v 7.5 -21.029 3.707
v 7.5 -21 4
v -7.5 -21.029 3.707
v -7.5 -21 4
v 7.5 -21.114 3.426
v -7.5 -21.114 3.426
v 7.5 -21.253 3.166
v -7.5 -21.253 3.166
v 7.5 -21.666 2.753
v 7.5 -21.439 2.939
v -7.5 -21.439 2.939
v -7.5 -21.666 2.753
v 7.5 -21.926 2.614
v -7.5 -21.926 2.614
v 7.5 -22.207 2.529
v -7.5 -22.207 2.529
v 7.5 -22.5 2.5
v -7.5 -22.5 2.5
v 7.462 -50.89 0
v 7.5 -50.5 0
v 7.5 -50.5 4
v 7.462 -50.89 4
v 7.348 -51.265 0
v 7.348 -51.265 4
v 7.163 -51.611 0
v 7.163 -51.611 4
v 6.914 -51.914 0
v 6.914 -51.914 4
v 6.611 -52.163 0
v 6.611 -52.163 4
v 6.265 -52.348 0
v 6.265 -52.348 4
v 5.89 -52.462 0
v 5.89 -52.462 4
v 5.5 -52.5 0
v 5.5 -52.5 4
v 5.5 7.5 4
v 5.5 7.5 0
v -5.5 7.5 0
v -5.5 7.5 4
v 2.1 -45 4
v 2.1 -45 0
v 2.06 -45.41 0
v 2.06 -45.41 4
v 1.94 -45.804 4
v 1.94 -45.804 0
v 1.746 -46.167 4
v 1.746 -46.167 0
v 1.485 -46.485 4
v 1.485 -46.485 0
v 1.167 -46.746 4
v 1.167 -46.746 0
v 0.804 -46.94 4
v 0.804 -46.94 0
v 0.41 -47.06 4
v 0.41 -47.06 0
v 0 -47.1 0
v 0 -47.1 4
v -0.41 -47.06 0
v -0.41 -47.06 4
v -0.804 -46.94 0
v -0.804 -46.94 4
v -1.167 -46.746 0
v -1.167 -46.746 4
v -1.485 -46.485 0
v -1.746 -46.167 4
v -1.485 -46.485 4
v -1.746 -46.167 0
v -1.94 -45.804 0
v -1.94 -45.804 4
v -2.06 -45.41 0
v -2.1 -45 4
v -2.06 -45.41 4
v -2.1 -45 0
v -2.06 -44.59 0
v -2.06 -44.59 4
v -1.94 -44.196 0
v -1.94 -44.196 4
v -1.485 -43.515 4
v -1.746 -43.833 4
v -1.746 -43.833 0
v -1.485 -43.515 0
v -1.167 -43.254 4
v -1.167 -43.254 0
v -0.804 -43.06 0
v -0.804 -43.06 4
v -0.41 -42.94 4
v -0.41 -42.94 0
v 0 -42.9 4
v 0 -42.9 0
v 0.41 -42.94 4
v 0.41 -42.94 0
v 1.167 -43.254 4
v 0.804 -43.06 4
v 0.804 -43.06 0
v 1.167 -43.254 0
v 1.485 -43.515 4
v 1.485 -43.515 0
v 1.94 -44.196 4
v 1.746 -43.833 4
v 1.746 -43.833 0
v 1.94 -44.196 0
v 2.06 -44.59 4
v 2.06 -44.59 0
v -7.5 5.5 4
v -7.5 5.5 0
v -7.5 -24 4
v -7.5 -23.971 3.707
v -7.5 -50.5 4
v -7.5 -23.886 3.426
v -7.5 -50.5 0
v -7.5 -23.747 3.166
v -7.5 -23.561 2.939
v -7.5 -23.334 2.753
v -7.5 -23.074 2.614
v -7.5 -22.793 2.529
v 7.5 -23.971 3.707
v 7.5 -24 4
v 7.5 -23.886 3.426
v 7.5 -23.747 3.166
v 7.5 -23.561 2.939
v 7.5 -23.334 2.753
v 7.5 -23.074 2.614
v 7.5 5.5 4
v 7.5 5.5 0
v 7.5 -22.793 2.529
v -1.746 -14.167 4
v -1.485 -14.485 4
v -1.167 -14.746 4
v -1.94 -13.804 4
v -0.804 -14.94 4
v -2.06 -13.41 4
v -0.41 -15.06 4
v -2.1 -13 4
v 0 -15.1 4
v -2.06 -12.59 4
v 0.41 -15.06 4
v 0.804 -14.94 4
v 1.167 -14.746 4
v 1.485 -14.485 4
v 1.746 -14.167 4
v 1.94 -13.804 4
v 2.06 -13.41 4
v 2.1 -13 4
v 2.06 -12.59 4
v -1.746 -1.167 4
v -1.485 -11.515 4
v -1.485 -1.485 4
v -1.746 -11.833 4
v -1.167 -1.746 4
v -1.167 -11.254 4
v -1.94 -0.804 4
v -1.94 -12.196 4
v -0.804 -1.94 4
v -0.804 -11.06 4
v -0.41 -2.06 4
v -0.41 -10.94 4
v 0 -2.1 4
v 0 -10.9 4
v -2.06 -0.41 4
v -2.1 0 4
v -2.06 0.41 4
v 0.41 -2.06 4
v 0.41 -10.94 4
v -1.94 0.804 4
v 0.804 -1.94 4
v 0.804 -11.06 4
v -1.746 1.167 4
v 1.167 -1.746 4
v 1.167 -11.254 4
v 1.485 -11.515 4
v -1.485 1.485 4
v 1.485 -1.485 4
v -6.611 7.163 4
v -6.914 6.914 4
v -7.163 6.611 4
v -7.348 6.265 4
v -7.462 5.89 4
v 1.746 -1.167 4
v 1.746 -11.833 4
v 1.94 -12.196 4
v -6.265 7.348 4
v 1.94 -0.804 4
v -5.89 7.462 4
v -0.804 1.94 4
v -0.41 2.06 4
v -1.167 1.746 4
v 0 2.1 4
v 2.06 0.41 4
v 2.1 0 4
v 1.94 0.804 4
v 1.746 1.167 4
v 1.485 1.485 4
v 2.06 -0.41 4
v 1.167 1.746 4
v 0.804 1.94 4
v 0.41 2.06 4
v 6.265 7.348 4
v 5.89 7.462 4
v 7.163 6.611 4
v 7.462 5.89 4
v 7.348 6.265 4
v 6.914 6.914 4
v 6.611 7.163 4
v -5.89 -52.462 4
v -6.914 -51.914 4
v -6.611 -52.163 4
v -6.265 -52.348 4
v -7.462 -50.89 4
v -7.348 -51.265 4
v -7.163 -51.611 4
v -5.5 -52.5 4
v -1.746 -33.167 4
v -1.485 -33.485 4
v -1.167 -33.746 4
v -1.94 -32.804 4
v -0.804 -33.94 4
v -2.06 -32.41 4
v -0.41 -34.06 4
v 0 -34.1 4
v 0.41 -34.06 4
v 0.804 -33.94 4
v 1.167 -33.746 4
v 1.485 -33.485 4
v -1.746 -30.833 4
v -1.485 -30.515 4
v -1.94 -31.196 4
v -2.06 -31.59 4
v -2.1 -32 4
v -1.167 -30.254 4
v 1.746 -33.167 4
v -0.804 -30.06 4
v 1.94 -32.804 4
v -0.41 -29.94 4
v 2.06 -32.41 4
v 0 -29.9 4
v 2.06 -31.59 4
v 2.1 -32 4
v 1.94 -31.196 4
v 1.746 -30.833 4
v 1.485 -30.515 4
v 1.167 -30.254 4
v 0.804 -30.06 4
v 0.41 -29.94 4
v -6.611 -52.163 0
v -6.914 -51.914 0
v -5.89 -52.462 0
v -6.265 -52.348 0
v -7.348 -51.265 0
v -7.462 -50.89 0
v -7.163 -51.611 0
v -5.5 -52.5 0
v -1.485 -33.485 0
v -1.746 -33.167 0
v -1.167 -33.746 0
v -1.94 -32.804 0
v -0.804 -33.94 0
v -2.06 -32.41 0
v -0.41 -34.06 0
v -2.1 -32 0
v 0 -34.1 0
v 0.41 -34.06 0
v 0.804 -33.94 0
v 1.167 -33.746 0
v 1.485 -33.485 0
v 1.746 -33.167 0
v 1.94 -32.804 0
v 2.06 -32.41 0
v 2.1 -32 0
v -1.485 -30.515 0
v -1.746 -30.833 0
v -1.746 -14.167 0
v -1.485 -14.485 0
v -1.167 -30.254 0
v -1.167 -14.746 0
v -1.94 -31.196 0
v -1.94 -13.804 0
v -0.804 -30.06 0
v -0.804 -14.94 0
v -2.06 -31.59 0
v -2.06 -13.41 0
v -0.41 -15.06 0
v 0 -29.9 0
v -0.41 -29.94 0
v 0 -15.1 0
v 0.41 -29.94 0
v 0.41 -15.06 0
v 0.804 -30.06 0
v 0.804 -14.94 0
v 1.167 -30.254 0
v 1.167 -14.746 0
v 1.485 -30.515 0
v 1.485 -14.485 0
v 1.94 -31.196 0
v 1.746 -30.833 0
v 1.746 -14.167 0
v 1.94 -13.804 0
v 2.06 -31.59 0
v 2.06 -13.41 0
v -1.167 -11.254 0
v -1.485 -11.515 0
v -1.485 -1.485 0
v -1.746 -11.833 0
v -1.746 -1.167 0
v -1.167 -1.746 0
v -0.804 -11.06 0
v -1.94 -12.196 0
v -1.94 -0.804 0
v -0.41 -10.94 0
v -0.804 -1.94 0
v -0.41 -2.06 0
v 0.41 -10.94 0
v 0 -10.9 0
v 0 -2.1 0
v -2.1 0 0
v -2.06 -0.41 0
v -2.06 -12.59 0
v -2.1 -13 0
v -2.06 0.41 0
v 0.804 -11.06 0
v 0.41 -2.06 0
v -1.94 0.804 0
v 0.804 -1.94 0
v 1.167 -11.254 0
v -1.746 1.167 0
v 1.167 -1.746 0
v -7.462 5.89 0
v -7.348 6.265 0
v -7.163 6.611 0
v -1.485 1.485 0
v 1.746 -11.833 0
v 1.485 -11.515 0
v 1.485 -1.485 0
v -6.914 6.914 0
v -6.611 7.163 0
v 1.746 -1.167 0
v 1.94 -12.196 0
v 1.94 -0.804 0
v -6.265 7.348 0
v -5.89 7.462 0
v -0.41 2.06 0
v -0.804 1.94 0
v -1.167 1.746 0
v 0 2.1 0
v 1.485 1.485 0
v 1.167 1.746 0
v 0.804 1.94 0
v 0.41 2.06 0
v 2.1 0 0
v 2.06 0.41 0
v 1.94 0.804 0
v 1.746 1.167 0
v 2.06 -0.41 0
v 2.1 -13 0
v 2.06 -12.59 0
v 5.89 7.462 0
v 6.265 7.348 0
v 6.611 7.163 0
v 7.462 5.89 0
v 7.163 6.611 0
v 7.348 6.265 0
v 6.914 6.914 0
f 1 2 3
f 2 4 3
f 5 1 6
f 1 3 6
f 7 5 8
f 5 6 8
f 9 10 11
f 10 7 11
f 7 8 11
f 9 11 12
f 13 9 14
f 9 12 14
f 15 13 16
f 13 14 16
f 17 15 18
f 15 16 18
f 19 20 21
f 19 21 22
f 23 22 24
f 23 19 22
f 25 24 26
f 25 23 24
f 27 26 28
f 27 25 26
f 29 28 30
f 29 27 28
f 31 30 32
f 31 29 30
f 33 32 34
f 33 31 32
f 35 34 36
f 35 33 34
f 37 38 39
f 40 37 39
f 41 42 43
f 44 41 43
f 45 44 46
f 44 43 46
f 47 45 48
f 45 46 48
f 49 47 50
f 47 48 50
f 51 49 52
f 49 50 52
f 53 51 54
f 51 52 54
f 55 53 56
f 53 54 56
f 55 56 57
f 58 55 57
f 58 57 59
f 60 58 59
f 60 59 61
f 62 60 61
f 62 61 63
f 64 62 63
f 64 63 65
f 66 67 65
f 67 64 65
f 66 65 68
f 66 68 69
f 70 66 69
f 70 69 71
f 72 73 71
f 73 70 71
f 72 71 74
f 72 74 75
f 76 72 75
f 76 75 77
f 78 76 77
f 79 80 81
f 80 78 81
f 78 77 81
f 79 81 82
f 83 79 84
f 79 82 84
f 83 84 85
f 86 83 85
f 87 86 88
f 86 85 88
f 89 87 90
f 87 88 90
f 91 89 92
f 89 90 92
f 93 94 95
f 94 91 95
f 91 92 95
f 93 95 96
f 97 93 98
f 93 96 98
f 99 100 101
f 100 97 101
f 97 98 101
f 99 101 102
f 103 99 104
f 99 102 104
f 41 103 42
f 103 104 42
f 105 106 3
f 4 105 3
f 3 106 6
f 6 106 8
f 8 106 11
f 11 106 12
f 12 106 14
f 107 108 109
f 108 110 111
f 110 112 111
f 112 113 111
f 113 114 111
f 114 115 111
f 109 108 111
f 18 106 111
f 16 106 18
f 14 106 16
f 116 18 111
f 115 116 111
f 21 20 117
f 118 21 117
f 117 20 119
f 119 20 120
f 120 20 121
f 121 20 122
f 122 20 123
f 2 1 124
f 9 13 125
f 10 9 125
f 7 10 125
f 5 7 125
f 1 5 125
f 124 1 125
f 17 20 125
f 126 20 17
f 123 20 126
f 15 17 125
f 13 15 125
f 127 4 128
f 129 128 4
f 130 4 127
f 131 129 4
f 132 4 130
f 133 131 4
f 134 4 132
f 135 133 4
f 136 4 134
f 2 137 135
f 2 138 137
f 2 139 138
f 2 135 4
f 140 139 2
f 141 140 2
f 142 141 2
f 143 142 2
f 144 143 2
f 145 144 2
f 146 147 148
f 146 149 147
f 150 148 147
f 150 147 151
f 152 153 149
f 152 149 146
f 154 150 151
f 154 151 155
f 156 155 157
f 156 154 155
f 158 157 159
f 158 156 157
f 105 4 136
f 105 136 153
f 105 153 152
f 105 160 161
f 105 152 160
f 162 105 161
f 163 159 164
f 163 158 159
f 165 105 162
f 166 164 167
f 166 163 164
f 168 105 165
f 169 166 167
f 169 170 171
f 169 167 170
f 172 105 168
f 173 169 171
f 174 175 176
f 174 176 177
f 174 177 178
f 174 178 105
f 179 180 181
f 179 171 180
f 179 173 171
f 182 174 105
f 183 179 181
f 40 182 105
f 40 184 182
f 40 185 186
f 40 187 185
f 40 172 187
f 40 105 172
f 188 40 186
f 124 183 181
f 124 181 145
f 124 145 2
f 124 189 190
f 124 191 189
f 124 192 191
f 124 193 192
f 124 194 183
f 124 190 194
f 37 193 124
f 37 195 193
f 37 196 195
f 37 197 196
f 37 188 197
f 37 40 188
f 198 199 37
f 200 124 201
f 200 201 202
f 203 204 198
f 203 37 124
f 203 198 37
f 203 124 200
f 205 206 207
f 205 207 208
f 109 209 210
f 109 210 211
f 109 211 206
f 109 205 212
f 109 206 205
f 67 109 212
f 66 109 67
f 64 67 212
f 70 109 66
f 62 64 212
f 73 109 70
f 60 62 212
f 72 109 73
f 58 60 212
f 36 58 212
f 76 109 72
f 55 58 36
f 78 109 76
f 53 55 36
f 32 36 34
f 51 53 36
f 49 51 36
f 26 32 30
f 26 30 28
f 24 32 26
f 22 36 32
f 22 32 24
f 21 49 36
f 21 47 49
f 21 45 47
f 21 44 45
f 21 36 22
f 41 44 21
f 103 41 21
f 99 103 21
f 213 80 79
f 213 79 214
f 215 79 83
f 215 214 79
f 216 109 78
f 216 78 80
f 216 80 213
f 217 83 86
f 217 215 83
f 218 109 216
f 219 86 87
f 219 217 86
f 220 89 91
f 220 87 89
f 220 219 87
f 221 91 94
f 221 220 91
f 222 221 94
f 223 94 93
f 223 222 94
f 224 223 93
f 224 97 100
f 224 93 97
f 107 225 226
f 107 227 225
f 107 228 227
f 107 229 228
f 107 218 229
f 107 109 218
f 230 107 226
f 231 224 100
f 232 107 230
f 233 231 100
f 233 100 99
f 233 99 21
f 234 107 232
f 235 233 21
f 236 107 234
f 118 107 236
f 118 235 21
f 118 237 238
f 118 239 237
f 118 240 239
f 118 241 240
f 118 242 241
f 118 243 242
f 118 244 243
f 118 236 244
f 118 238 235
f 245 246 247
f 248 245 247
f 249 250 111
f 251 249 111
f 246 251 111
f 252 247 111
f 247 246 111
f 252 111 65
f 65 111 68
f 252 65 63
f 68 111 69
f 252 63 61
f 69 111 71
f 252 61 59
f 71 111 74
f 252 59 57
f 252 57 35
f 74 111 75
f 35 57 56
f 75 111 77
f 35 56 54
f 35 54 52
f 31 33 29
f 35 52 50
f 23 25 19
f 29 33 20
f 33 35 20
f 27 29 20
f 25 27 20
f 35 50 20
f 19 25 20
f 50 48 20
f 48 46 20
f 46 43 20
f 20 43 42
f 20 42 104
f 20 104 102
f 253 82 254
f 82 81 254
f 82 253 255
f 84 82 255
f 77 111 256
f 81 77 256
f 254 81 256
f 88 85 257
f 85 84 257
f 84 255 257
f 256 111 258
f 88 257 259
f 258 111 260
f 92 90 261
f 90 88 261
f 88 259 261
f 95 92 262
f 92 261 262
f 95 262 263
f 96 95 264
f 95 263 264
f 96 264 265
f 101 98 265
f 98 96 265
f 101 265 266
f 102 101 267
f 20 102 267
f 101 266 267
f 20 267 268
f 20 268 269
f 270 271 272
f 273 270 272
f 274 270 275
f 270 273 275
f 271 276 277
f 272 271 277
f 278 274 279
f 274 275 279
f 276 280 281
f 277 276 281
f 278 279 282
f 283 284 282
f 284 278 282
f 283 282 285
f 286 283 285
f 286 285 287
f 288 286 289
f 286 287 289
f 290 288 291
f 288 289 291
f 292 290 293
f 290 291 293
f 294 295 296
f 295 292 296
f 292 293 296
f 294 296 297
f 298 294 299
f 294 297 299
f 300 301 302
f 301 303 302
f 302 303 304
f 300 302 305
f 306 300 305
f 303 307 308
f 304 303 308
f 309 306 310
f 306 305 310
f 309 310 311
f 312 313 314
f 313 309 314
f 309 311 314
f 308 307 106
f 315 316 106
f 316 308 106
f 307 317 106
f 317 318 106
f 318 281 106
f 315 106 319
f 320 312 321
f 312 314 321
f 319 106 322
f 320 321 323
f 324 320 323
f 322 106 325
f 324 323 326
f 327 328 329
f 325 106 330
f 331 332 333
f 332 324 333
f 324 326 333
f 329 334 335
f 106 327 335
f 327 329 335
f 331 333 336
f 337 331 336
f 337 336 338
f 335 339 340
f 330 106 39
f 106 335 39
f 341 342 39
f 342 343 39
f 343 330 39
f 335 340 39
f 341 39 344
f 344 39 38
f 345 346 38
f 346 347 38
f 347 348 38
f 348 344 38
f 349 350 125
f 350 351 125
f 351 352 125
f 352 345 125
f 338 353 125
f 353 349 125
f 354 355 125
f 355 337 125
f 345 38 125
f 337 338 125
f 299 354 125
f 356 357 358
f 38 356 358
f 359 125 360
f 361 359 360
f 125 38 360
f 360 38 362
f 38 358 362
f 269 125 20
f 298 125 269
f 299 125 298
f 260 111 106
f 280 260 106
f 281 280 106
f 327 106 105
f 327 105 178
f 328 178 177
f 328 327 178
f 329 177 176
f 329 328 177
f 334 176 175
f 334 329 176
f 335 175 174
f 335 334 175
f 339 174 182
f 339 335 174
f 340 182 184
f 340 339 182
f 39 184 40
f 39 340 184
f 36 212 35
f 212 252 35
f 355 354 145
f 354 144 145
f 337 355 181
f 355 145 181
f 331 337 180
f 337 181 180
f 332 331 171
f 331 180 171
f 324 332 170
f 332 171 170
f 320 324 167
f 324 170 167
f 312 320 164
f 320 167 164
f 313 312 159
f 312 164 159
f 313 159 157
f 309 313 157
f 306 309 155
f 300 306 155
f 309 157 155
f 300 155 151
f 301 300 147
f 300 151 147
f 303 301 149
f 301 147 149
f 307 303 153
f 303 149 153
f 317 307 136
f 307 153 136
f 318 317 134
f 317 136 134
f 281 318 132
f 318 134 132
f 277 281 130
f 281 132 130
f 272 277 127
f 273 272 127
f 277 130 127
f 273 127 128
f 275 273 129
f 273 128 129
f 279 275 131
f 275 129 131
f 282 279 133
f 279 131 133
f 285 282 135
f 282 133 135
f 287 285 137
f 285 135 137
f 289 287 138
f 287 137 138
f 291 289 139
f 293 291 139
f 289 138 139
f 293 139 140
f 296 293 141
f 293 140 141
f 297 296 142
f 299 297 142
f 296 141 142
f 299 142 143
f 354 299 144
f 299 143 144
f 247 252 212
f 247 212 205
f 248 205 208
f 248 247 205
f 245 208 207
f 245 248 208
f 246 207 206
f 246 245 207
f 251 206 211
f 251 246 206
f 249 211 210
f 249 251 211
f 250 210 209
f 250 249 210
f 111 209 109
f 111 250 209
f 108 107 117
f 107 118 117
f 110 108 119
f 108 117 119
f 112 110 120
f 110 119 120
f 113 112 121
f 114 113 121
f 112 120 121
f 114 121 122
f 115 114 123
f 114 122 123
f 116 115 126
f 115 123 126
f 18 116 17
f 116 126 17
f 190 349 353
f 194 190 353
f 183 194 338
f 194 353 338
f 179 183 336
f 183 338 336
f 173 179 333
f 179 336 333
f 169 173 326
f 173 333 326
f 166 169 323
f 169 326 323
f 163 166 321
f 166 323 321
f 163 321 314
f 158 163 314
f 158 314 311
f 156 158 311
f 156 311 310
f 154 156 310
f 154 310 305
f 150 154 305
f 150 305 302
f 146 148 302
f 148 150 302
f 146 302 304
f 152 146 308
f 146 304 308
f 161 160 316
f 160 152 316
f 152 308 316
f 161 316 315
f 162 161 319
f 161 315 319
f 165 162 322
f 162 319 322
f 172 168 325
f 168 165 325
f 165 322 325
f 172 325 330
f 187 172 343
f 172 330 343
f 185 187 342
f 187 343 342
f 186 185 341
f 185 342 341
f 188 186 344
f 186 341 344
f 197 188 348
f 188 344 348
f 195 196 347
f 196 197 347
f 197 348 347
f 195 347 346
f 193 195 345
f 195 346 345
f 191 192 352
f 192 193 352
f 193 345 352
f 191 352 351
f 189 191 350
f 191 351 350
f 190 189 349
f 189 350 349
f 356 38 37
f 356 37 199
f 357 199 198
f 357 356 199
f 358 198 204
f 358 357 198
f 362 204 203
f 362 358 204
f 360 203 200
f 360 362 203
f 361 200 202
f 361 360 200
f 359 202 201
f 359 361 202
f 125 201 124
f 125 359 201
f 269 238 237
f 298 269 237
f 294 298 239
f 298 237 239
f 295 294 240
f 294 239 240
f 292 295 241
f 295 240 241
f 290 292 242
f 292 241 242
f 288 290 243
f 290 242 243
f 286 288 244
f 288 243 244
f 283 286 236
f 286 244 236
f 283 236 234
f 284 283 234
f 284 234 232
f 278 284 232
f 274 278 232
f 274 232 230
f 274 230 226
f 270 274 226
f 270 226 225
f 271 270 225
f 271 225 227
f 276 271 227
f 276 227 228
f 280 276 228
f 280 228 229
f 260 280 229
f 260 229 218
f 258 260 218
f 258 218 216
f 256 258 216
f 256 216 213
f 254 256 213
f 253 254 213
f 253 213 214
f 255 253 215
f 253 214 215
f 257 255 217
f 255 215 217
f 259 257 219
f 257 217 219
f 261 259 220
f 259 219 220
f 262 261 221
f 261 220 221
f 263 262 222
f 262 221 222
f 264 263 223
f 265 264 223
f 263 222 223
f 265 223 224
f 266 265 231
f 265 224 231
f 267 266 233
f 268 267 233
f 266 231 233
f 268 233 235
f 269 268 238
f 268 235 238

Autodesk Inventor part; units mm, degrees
ref_plane "YZ Plane" through (0, 0, 0) normal (1, 0, 0) x (0, 1, 0)
ref_plane "XZ Plane" through (0, 0, 0) normal (0, 1, 0) x (-1, 0, 0)
ref_plane "XY Plane" through (0, 0, 0) normal (0, 0, 1) x (1, 0, 0)
ref_plane "Plano de trabalho1" through (0, -45, 0) normal (0, 0, 1) x (1, 0, 0)
sketch "Esboço1" plane through (0, -45, 0) normal (0, 0, 1) x (1, 0, 0)
  arc A0 (5.5, 37.5) -> (7.5, 39.5) centre (5.5, 39.5) ccw projected
  line L0 (7.5, 39.5) -> (7.5, 50.5) projected
  arc A1 (7.5, 50.5) -> (5.5, 52.5) centre (5.5, 50.5) ccw projected
  line L1 (5.5, 52.5) -> (-5.5, 52.5) projected
  arc A2 (-5.5, 52.5) -> (-7.5, 50.5) centre (-5.5, 50.5) ccw projected
  line L2 (-7.5, 50.5) -> (-7.5, 39.5) projected
  arc A3 (-7.5, 39.5) -> (-5.5, 37.5) centre (-5.5, 39.5) ccw projected
  line L3 (-5.5, 37.5) -> (5.5, 37.5) projected
  circle A4 centre (0, 45) radius 2.1 projected
  arc A5 (-7.5, -5.5) -> (-5.5, -7.5) centre (-5.5, -5.5) ccw projected
  line L4 (-5.5, -7.5) -> (5.5, -7.5) projected
  arc A6 (5.5, -7.5) -> (7.5, -5.5) centre (5.5, -5.5) ccw projected
  line L5 (7.5, -5.5) -> (7.5, 5.5) projected
  arc A7 (7.5, 5.5) -> (5.5, 7.5) centre (5.5, 5.5) ccw projected
  line L6 (5.5, 7.5) -> (-5.5, 7.5) projected
  arc A8 (-5.5, 7.5) -> (-7.5, 5.5) centre (-5.5, 5.5) ccw projected
  line L7 (-7.5, 5.5) -> (-7.5, -5.5) projected
  circle A9 centre (0, 0) radius 2.1 projected
  line L8 (7.5, 39.5) -> (7.5, 5.5)
  line L9 (-7.5, 39.5) -> (-7.5, 5.5)
extrude "Extrusão1" add sketch "Esboço1" along normal blind 4
sketch "Esboço2" plane through (0, -45, 4) normal (0, 0, 1) x (1, 0, 0)
  line L0 (7.5, -5.5) -> (7.5, 50.5) projected
  line L1 (-7.5, 50.5) -> (-7.5, -5.5) projected
  line L2 (7.5, 24) -> (-7.5, 24)
  line L3 (-7.5, 24) -> (-7.5, 21)
  line L4 (-7.5, 21) -> (7.5, 21)
  line L5 (7.5, 21) -> (7.5, 24)
  line L6 (5.5, 52.5) -> (-5.5, 52.5) projected
  line L7 (-5.5, -7.5) -> (5.5, -7.5) projected
  circle A0 centre (0, 32) radius 2.1
  circle A1 centre (0, 13) radius 2.1
  point P0 (0, 45)
  point P1 (7.5, 21)
  dimension "d4" = 28.5
  dimension "d5" = 28.5
  dimension "d6" = 3
  dimension "d7" = 4.2
  dimension "d8" = 4.2
  dimension "d9" = 8
  dimension "d10" = 8
extrude "Extrusão2" cut sketch "Esboço2" against normal blind 1.5
sketch "Esboço3" plane through (0, -13, 2.5) normal (0, 0, 1) x (1, 0, 0)
  circle A0 centre (0, 0) radius 2.1 projected
  circle A1 centre (0, -19) radius 2.1 projected
  point P0 (0, 13)
extrude "Extrusão3" cut sketch "Esboço3" against normal blind 10
fillet "Arredondamento1" radius 1.5 2 edges at (0, -21, 2.5) (0, -24, 2.5)
equation "\"d5\" = d4"
equation "\"d10\" = d9"
properties part number "suporte_termopar_al"
